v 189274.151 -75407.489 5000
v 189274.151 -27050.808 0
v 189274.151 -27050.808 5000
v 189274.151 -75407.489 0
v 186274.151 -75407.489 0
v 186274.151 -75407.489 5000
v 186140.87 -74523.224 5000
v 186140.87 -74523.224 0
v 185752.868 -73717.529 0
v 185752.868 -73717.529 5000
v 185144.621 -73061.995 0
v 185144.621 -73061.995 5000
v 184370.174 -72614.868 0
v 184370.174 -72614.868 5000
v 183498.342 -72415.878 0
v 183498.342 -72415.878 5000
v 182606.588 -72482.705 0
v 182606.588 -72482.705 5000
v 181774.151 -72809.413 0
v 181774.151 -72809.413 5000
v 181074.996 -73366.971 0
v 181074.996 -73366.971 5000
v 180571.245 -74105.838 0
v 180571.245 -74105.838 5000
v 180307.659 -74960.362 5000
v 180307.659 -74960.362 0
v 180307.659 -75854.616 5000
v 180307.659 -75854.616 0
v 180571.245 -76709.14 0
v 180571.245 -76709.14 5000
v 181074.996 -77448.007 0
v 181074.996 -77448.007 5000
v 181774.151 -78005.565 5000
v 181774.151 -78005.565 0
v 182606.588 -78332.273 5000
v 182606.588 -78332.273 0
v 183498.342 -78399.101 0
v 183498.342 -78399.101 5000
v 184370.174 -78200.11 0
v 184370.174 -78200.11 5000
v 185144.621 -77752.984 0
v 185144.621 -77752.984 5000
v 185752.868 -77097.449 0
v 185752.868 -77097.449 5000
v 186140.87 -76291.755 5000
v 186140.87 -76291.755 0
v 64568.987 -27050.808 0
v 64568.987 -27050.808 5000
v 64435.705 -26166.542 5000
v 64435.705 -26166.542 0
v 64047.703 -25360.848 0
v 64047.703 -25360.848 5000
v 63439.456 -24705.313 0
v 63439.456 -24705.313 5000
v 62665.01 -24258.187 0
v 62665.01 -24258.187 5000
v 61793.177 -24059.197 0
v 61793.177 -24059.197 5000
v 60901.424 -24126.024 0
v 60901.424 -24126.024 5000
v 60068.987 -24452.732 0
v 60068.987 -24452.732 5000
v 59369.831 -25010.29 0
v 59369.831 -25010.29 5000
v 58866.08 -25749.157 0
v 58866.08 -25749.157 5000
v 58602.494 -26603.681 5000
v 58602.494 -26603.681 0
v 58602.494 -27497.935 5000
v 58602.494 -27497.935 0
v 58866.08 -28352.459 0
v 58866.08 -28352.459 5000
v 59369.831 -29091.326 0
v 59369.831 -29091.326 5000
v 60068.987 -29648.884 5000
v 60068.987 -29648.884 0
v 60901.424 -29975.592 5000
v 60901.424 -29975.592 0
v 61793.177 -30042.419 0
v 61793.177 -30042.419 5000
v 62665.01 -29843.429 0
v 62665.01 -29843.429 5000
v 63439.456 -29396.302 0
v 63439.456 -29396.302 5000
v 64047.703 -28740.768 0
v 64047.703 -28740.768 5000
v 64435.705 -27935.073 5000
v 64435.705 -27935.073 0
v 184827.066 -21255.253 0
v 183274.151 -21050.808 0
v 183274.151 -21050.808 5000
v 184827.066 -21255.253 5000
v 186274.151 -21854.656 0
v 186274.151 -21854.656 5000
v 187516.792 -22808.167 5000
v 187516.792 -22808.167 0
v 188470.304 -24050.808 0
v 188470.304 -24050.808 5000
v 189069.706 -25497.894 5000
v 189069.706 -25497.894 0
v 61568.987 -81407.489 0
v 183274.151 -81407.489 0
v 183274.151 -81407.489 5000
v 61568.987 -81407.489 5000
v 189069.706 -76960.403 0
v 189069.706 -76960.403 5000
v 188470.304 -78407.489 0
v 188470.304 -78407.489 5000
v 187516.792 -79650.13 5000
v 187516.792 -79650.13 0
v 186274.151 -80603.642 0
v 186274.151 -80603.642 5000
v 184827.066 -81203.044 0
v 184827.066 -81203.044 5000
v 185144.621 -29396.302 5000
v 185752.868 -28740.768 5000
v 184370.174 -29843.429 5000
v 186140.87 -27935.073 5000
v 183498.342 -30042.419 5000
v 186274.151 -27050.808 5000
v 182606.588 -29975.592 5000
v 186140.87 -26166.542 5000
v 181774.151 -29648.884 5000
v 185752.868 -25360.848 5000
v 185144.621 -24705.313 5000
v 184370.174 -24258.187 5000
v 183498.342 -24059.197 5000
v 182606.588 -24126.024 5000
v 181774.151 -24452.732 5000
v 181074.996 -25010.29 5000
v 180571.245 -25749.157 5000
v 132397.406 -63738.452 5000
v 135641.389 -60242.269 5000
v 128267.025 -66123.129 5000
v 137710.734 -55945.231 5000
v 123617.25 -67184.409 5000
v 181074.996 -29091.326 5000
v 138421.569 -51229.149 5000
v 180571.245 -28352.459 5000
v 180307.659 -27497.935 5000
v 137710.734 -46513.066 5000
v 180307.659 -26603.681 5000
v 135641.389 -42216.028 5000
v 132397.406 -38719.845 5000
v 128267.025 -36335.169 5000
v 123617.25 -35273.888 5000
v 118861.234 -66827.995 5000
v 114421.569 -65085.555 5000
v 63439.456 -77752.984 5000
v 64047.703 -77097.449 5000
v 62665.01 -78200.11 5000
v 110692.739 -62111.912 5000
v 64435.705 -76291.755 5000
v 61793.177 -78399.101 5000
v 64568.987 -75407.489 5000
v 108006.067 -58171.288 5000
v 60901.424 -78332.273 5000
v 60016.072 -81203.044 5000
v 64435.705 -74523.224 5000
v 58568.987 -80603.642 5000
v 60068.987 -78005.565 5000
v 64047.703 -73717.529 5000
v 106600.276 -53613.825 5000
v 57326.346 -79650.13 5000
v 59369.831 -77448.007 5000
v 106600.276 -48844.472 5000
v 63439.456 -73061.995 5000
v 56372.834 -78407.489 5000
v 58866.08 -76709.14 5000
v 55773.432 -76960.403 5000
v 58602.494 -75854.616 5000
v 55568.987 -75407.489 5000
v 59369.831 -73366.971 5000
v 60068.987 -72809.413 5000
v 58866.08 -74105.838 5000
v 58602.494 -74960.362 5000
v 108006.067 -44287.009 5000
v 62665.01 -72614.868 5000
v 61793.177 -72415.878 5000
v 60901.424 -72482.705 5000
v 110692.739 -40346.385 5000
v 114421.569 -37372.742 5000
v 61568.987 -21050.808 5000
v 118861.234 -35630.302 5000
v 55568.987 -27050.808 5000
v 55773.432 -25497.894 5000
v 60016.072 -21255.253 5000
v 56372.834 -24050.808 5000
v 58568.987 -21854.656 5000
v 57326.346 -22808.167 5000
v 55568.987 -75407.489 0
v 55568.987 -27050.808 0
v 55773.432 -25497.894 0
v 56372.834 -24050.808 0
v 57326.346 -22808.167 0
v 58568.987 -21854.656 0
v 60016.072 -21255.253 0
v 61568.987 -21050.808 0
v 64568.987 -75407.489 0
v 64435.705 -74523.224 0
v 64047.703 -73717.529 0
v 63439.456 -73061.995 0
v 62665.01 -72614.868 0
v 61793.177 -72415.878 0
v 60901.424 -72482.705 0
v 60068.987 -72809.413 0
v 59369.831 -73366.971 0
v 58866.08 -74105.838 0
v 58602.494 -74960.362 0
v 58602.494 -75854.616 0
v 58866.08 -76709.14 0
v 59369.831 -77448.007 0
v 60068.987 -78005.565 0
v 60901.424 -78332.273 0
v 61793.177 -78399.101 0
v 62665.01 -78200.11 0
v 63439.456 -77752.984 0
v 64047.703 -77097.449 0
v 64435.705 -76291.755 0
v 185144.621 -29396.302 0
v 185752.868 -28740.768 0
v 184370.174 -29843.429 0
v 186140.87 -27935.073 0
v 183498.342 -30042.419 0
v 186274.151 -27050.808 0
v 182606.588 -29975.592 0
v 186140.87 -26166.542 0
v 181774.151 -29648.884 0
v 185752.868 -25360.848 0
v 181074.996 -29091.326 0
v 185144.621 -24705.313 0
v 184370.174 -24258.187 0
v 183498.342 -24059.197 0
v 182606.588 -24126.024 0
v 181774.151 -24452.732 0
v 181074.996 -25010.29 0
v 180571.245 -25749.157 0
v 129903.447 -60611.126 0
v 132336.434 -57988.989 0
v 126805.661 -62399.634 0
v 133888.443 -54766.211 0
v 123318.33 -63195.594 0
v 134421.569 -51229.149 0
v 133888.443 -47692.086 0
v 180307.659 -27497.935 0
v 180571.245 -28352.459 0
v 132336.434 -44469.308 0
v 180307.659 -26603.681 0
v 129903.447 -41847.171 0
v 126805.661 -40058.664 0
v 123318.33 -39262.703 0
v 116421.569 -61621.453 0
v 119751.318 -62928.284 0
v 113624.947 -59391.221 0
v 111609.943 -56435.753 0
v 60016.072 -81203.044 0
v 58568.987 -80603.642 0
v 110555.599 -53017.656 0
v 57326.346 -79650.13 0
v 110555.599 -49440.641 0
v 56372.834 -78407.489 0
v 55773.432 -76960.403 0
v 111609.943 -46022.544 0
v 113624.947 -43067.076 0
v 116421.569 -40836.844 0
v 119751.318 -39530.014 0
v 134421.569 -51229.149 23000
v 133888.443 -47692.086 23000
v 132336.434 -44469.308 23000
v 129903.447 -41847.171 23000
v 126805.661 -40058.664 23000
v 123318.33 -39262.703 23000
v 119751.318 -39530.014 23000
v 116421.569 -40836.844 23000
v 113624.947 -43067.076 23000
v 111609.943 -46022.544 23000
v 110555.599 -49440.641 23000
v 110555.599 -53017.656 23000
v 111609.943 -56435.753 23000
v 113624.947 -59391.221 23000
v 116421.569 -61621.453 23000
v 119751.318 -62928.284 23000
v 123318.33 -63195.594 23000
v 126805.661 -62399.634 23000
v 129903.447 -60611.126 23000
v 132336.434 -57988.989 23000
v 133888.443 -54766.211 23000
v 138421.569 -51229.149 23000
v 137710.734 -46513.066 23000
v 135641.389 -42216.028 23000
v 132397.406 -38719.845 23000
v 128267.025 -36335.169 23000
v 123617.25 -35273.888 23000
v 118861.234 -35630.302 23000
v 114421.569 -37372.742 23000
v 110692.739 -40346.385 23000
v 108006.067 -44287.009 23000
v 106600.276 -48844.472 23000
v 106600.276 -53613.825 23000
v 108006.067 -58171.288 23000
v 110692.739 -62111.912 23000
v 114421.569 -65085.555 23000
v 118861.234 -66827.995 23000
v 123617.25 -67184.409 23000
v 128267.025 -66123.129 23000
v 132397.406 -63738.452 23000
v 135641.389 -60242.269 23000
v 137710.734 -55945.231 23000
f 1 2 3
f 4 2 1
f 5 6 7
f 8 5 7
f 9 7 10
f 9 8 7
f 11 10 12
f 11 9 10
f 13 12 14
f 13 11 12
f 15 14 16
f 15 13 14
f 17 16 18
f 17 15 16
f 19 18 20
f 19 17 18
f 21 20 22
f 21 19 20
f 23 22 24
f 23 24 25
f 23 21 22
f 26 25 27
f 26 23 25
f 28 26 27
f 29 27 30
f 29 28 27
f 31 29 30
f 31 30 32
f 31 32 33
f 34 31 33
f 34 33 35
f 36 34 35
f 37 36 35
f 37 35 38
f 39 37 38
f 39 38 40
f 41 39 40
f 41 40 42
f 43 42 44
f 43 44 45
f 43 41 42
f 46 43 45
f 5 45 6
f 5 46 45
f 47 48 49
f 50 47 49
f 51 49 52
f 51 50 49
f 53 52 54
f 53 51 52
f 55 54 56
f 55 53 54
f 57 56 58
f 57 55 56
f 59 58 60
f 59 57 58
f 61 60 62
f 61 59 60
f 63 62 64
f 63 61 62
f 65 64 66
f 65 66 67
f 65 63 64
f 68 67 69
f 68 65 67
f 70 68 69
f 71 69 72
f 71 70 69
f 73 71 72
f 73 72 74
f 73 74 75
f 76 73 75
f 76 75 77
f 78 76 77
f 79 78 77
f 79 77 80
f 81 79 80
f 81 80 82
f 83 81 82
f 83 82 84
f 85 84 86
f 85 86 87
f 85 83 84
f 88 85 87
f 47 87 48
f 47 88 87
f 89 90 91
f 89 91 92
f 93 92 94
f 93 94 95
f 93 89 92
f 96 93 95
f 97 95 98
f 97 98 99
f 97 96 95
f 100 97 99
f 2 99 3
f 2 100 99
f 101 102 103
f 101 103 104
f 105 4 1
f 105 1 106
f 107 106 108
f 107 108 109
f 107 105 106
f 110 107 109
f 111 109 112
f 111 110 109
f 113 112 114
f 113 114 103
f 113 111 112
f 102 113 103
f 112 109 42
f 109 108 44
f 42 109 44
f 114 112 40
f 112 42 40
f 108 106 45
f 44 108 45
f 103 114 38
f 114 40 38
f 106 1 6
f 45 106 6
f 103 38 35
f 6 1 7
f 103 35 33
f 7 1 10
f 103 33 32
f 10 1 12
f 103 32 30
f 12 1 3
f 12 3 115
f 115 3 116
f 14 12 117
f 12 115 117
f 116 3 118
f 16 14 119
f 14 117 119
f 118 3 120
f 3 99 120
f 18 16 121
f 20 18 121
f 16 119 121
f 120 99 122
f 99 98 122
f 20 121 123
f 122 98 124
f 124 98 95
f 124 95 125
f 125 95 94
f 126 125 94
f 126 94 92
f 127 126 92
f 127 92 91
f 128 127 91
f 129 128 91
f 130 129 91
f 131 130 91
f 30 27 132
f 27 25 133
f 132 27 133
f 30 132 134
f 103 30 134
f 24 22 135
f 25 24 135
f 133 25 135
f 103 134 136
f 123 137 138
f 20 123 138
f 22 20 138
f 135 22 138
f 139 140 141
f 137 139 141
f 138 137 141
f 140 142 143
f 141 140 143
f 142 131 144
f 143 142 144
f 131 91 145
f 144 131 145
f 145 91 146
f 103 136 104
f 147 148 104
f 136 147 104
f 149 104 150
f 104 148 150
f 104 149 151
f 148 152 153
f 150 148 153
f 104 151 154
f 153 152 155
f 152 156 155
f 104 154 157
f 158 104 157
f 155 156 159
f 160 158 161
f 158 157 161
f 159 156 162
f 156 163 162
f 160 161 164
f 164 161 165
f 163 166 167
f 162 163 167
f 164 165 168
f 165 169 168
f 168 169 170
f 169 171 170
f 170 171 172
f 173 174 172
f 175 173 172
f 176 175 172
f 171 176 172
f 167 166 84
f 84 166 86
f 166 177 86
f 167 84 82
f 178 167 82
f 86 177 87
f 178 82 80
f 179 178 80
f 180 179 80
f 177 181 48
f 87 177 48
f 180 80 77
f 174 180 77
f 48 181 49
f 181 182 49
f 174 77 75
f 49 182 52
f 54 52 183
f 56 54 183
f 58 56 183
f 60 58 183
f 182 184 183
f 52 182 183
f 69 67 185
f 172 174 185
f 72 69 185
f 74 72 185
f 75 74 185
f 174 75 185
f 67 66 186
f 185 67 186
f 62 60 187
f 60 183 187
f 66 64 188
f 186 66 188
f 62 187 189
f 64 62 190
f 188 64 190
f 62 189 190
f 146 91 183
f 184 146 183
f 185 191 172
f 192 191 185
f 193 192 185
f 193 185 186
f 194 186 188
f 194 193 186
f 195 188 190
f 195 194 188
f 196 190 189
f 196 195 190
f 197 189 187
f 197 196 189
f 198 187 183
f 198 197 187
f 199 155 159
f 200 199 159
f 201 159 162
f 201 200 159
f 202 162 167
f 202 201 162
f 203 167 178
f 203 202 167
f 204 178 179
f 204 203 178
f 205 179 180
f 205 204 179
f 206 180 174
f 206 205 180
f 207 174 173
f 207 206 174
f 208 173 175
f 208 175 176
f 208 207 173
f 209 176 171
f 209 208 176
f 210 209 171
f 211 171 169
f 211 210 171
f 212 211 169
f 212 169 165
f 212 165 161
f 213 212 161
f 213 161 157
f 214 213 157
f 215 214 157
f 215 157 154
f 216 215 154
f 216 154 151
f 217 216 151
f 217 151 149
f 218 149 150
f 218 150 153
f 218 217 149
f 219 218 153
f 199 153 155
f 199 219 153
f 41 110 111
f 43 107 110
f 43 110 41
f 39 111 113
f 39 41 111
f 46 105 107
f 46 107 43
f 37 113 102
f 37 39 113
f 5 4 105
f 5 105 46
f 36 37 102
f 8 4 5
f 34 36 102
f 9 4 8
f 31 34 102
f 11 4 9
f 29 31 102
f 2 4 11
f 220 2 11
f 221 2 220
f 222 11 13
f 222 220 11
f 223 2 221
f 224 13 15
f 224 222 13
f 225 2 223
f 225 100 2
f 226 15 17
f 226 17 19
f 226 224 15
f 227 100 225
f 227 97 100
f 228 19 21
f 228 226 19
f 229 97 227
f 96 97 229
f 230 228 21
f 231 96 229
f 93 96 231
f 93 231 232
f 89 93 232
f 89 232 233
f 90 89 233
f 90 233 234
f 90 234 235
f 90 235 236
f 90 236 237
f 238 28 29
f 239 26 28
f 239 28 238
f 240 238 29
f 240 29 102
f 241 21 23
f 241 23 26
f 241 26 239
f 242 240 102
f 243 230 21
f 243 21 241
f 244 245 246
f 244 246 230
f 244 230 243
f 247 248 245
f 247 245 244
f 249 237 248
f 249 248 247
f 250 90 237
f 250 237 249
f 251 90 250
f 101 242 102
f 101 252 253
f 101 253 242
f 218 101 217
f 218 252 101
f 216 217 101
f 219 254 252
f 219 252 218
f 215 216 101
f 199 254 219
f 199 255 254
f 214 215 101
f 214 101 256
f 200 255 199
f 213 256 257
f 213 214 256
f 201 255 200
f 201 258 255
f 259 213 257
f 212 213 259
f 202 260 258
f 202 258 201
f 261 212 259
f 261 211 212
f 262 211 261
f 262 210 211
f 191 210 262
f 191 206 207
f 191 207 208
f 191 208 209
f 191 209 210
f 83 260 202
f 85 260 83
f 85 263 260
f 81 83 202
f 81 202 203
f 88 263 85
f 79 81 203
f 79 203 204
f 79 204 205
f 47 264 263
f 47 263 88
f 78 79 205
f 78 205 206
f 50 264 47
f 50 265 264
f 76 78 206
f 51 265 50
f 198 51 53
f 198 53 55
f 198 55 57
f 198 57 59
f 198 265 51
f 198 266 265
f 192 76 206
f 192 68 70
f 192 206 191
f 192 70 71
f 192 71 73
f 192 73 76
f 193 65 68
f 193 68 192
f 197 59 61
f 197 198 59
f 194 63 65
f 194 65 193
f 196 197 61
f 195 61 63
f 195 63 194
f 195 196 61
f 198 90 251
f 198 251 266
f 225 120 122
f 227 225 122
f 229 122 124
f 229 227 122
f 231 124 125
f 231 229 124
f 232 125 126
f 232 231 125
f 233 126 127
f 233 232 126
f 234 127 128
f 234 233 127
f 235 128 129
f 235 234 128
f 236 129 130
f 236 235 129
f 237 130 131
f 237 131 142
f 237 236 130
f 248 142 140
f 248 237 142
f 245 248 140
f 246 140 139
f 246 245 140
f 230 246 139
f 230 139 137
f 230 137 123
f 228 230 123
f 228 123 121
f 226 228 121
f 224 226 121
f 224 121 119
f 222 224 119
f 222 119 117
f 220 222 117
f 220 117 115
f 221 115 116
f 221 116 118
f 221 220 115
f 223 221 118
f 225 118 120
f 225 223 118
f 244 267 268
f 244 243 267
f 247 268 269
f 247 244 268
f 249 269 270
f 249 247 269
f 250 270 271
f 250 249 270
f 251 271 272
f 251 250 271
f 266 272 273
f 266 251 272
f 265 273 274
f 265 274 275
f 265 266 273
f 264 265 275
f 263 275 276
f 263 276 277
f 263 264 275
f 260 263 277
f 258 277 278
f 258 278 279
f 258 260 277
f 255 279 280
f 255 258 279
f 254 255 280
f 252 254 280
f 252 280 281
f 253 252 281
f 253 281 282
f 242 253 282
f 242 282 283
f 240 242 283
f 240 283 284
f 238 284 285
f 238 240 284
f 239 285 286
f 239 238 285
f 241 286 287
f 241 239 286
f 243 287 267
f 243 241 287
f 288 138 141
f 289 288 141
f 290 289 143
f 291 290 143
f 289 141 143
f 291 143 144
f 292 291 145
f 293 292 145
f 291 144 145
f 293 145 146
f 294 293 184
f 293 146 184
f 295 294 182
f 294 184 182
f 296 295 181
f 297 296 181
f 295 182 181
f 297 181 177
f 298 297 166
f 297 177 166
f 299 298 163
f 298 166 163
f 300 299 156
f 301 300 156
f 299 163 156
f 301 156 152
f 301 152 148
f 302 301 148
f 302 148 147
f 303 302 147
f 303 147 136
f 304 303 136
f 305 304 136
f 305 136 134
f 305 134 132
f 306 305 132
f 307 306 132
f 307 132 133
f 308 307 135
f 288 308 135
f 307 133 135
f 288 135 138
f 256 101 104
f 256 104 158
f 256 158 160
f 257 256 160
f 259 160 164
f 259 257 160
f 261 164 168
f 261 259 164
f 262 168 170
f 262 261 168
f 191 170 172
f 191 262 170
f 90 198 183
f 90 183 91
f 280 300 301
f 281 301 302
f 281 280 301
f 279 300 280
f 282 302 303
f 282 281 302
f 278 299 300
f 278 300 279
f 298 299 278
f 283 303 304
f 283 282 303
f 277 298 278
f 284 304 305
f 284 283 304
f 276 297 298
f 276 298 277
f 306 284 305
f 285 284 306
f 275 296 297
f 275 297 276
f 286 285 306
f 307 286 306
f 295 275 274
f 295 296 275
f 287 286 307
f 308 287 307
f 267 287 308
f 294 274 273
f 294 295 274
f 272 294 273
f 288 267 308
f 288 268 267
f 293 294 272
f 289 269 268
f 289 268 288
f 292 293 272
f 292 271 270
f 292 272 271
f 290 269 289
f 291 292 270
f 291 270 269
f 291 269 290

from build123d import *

# Parameters (mm, degrees)
SKETCH1_R           = 12000
SKETCH1_R_2         = 3000
BOSS_EXTRUDE2_DEPTH = 5000
SKETCH2_R           = 16000
SKETCH2_R_2         = 12000
BOSS_EXTRUDE3_DEPTH = 18000


with BuildPart() as part:
    # Sketch1 → Boss-Extrude2 (new body)
    with BuildSketch(Plane.XY):
        with BuildLine():
            Line((61568.986707958, -21050.807931945), (183274.151255793, -21050.807931945))
            ThreePointArc((183274.151255793, -21050.807931945), (187516.791942913, -22808.167244826), (189274.151255793, -27050.807931945))
            Line((189274.151255793, -27050.807931945), (189274.151255793, -75407.489196212))
            ThreePointArc((189274.151255793, -75407.489196212), (187516.791942913, -79650.129883331), (183274.151255793, -81407.489196212))
            Line((183274.151255793, -81407.489196212), (61568.986707958, -81407.489196212))
            ThreePointArc((61568.986707958, -81407.489196212), (57326.346020839, -79650.129883331), (55568.986707958, -75407.489196212))
            Line((55568.986707958, -75407.489196212), (55568.986707958, -27050.807931945))
            ThreePointArc((55568.986707958, -27050.807931945), (57326.346020839, -22808.167244826), (61568.986707958, -21050.807931945))
        make_face()
        with Locations((122421.568981876, -51229.148564079)):
            Circle(SKETCH1_R, mode=Mode.SUBTRACT)
        with Locations((61568.986707958, -27050.807931945)):
            Circle(SKETCH1_R_2, mode=Mode.SUBTRACT)
        with Locations((183274.151255793, -27050.807931945)):
            Circle(SKETCH1_R_2, mode=Mode.SUBTRACT)
        with Locations((183274.151255793, -75407.489196212)):
            Circle(SKETCH1_R_2, mode=Mode.SUBTRACT)
        with Locations((61568.986707958, -75407.489196212)):
            Circle(SKETCH1_R_2, mode=Mode.SUBTRACT)
    extrude(amount=BOSS_EXTRUDE2_DEPTH)

    # Sketch2 → Boss-Extrude3 (add)
    with BuildSketch(Plane.XY.offset(5000)):
        with Locations((122421.568981876, -51229.148564079)):
            Circle(SKETCH2_R)
        with Locations((122421.568981876, -51229.148564079)):
            Circle(SKETCH2_R_2, mode=Mode.SUBTRACT)
    extrude(amount=BOSS_EXTRUDE3_DEPTH)


solid = part.part
